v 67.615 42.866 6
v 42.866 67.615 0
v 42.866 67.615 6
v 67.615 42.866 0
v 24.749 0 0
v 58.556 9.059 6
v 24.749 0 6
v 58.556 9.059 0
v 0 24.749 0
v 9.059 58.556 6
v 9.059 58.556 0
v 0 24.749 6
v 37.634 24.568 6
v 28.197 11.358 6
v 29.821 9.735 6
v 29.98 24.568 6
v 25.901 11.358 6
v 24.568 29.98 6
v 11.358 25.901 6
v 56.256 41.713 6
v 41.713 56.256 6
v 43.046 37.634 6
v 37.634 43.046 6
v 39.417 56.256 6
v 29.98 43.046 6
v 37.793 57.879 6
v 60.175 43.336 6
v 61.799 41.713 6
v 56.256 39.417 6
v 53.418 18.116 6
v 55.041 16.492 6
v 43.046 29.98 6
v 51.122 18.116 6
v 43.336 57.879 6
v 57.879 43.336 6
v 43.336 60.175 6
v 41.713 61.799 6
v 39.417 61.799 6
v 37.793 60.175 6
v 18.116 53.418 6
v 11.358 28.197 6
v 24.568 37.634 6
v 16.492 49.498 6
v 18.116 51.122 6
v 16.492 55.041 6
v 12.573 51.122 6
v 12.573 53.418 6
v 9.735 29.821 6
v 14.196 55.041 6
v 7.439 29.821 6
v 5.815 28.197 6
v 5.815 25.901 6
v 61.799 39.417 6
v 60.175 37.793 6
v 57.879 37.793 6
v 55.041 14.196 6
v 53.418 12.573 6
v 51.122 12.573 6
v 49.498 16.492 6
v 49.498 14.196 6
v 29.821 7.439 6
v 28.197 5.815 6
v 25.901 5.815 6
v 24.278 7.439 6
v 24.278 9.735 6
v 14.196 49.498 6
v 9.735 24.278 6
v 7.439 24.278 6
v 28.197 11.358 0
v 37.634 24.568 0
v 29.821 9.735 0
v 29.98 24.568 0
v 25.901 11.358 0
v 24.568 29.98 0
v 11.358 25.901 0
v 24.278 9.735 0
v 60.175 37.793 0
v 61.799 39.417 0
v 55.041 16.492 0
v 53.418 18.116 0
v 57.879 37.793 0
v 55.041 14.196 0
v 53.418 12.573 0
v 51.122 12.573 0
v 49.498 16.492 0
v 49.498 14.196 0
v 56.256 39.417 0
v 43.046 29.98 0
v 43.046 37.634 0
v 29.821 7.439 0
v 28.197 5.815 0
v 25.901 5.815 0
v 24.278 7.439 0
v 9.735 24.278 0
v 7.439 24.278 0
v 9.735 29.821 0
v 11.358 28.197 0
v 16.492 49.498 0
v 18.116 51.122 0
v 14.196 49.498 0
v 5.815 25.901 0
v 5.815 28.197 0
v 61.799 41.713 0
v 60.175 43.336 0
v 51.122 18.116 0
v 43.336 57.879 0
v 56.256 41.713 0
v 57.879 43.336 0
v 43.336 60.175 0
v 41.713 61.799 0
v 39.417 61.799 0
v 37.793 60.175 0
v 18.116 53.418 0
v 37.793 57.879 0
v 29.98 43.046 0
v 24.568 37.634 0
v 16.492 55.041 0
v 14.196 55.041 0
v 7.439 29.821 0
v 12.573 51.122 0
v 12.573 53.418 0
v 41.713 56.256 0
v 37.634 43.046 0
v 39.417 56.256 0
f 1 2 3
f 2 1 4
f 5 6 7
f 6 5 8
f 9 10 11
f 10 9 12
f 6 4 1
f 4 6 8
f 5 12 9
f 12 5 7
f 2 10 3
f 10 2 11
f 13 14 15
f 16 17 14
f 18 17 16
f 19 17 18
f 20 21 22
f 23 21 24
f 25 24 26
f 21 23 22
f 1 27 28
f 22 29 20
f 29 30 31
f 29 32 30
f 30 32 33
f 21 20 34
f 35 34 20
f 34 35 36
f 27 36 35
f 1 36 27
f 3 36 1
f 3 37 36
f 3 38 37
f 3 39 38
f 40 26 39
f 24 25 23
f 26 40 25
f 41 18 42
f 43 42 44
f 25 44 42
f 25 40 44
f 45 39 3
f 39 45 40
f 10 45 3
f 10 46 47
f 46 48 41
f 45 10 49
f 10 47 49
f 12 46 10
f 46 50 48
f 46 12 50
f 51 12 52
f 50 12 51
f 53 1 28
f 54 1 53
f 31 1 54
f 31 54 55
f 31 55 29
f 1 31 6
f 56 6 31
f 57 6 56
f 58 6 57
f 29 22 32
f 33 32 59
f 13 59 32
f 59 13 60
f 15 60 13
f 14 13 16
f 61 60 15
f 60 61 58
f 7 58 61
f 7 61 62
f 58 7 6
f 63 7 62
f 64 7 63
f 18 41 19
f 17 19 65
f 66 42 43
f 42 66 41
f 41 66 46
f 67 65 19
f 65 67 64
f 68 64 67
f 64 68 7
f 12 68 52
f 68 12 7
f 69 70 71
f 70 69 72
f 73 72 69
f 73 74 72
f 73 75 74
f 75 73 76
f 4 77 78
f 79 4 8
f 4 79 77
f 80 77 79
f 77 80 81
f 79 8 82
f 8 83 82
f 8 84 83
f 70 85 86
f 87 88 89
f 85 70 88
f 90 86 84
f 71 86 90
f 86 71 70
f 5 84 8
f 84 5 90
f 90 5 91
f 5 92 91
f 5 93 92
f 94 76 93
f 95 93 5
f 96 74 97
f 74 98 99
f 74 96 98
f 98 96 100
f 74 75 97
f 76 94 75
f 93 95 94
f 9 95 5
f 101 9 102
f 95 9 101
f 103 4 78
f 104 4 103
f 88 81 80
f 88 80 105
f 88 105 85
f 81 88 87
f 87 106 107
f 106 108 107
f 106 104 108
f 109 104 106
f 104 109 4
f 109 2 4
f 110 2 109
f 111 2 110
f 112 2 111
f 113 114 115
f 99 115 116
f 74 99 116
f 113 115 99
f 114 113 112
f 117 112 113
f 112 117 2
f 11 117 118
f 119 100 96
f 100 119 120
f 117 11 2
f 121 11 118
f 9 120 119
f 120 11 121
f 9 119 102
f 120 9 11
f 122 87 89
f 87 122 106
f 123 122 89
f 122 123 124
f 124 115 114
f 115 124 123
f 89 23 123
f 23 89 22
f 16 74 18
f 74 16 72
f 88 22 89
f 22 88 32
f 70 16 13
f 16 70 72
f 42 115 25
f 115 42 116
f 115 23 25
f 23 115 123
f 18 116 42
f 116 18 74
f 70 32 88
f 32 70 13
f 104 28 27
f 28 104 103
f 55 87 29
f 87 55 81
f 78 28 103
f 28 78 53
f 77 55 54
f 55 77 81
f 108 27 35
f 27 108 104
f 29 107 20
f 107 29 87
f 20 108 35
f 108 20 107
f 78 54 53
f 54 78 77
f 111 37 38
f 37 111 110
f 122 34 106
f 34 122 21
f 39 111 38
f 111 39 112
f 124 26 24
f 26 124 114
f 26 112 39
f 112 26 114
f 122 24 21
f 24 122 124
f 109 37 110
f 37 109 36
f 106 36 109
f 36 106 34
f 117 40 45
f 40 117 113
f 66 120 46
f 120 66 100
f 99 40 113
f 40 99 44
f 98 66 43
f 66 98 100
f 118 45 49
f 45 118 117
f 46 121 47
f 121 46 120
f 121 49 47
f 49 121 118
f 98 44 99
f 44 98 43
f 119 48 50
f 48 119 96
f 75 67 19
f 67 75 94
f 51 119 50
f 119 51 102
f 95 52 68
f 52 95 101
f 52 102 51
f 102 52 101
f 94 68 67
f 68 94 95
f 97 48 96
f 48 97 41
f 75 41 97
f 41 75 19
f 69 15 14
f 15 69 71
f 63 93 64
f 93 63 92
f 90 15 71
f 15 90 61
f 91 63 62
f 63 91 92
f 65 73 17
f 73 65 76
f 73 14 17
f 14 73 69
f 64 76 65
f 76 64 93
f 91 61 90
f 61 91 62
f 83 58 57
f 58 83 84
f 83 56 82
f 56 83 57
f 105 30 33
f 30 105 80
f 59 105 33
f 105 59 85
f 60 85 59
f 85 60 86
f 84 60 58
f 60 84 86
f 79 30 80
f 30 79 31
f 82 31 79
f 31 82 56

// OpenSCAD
$fn = 32;

// ----------------------------------------------------------------------
// Polygon plate: 6-gon R35, 6 bolt windows
// ----------------------------------------------------------------------

// --- parameters (mm) ---
sides = 6;                // number of polygon sides
plate_r = 35;             // circumscribed radius of the polygon
bore_r = 10;              // centre bore radius
bolts = 6;                // number of bolt windows
ring_r = 26.11;           // bolt-circle radius
bolt_r = 3;               // bolt window radius
plate_t = 6;              // plate thickness, Z (extrusion height)
fit_tol = 0.05;           // declared fit tolerance (prompt contract)
free_tol = 0.2;           // declared free tolerance (prompt contract)

plate_d = 2 * plate_r;  // circumscribed diameter
bore_d = 2 * bore_r;  // centre bore diameter
bolt_d = 2 * bolt_r;  // bolt window diameter
ring_d = 2 * ring_r;  // bolt-circle diameter

profile = [[67.615, 42.866], [42.866, 67.615], [9.059, 58.556], [0, 24.749], [24.749, 0], [58.556, 9.059]];  // primary outline, 6 points, counter clockwise
void_1 = [[43.046, 37.634], [37.634, 43.046], [29.98, 43.046], [24.568, 37.634], [24.568, 29.98], [29.98, 24.568], [37.634, 24.568], [43.046, 29.98]];  // centre bore, 8 points
void_2 = [[61.799, 41.713], [60.175, 43.336], [57.879, 43.336], [56.256, 41.713], [56.256, 39.417], [57.879, 37.793], [60.175, 37.793], [61.799, 39.417]];  // bolt window 1, 8 points
void_3 = [[43.336, 60.175], [41.713, 61.799], [39.417, 61.799], [37.793, 60.175], [37.793, 57.879], [39.417, 56.256], [41.713, 56.256], [43.336, 57.879]];  // bolt window 2, 8 points
void_4 = [[18.116, 53.418], [16.492, 55.041], [14.196, 55.041], [12.573, 53.418], [12.573, 51.122], [14.196, 49.498], [16.492, 49.498], [18.116, 51.122]];  // bolt window 3, 8 points
void_5 = [[11.358, 28.197], [9.735, 29.821], [7.439, 29.821], [5.815, 28.197], [5.815, 25.901], [7.439, 24.278], [9.735, 24.278], [11.358, 25.901]];  // bolt window 4, 8 points
void_6 = [[29.821, 9.735], [28.197, 11.358], [25.901, 11.358], [24.278, 9.735], [24.278, 7.439], [25.901, 5.815], [28.197, 5.815], [29.821, 7.439]];  // bolt window 5, 8 points
void_7 = [[55.041, 16.492], [53.418, 18.116], [51.122, 18.116], [49.498, 16.492], [49.498, 14.196], [51.122, 12.573], [53.418, 12.573], [55.041, 14.196]];  // bolt window 6, 8 points

// --- the one profile operation ---
difference() {
  linear_extrude(height = plate_t) polygon(points = profile);
  translate([0, 0, -1])
    linear_extrude(height = plate_t + 2) polygon(points = void_1);
  translate([0, 0, -1])
    linear_extrude(height = plate_t + 2) polygon(points = void_2);
  translate([0, 0, -1])
    linear_extrude(height = plate_t + 2) polygon(points = void_3);
  translate([0, 0, -1])
    linear_extrude(height = plate_t + 2) polygon(points = void_4);
  translate([0, 0, -1])
    linear_extrude(height = plate_t + 2) polygon(points = void_5);
  translate([0, 0, -1])
    linear_extrude(height = plate_t + 2) polygon(points = void_6);
  translate([0, 0, -1])
    linear_extrude(height = plate_t + 2) polygon(points = void_7);
}
